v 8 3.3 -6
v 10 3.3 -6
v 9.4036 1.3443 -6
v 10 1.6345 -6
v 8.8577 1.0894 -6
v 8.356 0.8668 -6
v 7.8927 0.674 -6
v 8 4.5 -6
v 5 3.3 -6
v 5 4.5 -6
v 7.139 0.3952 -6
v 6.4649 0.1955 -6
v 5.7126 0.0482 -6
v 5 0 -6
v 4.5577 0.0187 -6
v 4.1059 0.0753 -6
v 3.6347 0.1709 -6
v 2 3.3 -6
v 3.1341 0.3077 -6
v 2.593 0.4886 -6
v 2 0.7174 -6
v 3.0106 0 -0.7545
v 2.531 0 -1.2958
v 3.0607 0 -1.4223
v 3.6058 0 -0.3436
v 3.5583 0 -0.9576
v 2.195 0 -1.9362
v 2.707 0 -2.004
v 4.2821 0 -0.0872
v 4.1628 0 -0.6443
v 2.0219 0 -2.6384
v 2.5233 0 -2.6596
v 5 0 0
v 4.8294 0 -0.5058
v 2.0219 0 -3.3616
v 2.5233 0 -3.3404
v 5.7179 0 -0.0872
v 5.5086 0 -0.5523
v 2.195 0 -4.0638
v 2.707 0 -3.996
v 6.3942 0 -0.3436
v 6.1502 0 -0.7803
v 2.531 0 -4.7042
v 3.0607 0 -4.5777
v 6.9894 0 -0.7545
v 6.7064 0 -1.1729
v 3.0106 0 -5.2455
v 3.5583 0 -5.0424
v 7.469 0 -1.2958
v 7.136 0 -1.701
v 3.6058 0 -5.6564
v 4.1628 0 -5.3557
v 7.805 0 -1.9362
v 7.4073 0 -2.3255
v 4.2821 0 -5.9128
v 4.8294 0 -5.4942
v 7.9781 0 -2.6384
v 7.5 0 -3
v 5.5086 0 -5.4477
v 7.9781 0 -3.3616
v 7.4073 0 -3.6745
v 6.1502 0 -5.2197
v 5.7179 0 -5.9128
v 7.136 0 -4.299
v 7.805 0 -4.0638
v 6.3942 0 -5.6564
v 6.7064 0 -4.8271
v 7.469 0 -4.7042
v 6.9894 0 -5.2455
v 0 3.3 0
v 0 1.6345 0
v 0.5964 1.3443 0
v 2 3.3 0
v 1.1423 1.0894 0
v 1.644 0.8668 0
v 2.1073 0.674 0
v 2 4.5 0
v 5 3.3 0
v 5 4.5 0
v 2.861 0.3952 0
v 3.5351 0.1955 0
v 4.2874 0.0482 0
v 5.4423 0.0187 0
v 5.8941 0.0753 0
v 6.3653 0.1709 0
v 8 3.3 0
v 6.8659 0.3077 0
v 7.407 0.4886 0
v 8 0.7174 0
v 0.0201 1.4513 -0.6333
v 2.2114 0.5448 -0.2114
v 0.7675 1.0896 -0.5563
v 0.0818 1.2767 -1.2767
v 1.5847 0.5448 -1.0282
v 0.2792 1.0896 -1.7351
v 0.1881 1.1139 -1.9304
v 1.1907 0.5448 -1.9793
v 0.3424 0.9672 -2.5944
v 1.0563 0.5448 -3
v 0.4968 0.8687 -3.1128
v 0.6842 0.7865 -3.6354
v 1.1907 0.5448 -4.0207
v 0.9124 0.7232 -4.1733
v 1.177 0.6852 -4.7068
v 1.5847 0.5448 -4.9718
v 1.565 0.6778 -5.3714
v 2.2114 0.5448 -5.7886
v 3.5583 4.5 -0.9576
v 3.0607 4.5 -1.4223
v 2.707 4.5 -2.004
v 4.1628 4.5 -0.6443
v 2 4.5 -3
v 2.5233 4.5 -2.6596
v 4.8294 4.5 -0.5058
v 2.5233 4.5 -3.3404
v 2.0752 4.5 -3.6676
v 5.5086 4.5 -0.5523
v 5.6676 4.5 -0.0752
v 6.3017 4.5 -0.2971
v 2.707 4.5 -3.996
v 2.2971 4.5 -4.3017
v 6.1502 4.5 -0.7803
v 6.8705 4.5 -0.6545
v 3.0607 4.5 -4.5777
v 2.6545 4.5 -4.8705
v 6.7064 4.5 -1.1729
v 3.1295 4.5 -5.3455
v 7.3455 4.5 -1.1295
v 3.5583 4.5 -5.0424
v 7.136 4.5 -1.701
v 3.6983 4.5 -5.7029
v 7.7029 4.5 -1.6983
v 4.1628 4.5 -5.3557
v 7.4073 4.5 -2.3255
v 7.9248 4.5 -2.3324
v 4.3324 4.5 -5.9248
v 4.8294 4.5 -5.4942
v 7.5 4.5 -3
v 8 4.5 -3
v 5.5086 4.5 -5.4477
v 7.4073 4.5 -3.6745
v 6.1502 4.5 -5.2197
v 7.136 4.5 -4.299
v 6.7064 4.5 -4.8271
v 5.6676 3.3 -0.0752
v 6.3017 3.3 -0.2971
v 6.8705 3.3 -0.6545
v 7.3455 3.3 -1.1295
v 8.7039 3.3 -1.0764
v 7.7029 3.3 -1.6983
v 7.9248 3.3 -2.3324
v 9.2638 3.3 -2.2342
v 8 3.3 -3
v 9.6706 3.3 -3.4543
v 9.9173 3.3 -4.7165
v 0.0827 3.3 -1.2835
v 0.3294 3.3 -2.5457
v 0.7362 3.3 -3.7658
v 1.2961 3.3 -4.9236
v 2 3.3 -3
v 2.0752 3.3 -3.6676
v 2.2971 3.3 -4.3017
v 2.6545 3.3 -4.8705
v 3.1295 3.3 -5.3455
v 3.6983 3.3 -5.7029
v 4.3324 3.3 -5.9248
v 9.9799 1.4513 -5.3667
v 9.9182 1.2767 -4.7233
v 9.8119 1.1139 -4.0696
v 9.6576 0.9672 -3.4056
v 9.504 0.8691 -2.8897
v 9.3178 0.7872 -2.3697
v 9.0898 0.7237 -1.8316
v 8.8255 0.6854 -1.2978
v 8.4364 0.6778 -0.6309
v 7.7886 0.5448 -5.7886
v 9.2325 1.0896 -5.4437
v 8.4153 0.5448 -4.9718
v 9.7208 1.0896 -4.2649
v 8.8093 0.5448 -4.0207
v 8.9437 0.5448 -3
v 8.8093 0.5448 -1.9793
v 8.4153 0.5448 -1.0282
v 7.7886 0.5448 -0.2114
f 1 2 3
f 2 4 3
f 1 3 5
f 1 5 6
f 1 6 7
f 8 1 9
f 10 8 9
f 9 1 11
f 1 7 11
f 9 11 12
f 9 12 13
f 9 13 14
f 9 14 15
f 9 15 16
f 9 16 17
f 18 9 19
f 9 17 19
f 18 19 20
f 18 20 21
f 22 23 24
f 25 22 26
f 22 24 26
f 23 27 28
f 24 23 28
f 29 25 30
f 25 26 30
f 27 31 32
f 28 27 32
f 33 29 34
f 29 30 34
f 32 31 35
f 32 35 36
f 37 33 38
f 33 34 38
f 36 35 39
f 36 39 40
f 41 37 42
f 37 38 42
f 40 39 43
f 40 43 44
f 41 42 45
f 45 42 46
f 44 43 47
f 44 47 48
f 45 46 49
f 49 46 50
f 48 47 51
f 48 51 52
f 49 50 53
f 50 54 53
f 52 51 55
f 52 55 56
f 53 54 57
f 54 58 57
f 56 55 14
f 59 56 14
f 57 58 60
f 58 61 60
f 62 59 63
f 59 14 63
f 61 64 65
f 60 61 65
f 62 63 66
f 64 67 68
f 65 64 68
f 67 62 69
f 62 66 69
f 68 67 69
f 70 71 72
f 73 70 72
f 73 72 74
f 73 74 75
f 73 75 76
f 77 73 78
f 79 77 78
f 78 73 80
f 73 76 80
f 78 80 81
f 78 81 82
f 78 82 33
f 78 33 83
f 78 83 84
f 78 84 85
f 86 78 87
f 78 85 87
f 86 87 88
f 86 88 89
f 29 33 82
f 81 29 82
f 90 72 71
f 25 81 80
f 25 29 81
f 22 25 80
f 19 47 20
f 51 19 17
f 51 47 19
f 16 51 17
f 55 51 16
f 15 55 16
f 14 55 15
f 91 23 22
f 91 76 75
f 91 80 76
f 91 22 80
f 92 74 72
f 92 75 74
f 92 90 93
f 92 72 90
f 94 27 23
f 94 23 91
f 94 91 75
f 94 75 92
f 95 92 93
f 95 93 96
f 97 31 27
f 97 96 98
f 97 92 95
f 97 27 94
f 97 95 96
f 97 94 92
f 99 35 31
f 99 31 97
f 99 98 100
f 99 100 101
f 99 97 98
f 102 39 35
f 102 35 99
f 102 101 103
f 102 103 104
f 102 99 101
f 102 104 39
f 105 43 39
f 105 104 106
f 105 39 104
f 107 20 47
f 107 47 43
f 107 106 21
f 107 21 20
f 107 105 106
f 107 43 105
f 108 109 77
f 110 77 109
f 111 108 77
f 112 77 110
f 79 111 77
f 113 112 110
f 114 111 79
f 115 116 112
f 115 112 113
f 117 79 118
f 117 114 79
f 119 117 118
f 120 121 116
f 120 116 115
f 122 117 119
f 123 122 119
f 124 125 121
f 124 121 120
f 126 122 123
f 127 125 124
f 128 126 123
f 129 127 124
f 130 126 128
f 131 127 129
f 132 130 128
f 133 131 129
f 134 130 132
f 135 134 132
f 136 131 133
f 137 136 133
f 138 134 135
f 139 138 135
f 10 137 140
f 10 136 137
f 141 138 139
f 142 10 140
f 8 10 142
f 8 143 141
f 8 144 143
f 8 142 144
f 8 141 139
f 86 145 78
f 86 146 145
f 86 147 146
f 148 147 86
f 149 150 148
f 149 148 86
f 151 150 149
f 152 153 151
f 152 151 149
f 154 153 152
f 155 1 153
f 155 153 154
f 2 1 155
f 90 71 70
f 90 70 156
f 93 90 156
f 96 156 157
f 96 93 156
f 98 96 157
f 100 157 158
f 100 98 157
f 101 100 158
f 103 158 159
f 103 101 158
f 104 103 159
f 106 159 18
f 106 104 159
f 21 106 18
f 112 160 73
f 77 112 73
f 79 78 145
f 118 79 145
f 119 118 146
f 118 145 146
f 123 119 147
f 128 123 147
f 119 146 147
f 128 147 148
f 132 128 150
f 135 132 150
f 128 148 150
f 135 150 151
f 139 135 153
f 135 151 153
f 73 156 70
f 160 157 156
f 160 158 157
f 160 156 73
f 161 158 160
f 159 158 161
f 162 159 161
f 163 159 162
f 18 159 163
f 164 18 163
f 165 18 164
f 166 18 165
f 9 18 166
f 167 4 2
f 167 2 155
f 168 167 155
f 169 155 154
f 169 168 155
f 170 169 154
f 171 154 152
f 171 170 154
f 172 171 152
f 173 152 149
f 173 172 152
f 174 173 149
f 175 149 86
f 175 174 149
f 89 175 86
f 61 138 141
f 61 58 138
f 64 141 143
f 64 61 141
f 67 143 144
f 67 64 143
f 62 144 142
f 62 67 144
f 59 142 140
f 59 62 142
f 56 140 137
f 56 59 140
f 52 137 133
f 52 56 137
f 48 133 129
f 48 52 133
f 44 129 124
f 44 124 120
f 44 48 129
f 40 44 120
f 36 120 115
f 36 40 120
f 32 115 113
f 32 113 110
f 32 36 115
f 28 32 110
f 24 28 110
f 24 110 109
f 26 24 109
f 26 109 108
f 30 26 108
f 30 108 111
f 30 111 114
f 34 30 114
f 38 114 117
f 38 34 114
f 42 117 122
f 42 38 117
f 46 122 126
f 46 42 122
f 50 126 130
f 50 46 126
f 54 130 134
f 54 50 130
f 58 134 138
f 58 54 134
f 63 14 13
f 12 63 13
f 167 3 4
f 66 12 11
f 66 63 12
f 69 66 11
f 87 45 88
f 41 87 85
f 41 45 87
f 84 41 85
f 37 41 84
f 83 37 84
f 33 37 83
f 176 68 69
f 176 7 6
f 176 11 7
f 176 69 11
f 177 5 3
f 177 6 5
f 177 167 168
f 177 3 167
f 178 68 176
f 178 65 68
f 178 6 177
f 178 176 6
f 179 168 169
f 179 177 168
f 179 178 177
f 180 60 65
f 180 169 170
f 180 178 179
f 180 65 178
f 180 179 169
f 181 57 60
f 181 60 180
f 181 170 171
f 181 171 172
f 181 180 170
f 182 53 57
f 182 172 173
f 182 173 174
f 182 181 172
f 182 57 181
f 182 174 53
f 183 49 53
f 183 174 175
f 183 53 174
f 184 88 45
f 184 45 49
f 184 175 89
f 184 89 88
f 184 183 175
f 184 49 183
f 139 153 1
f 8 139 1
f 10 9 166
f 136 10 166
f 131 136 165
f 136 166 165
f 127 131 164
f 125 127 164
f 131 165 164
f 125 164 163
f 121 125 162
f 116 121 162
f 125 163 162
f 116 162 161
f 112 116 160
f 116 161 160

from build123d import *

# Parameters (mm, degrees)
SKETCH_1_W          = 10
SKETCH_1_H          = 6
SKETCH_1_R          = 2.5
EXTRUDE_1_DEPTH     = 3.3
SKETCH_2_R          = 2.5
EXTRUDE_2_DEPTH     = 1.2
CUT_EXTRUDE_1_DEPTH = 5.5


with BuildPart() as part:
    # 草图1 → 凸台-拉伸1 (new body)
    with BuildSketch(Plane(origin=(0, 0, 0), x_dir=(1, 0, 0), z_dir=(0, 1, 0))):
        with Locations((5, 3)):
            Rectangle(SKETCH_1_W, SKETCH_1_H)
        with Locations((5, 3)):
            Circle(SKETCH_1_R, mode=Mode.SUBTRACT)
    extrude(amount=EXTRUDE_1_DEPTH)

    # 草图2 → 凸台-拉伸2 (add)
    with BuildSketch(Plane(origin=(0, 3.3, 0), x_dir=(1, 0, 0), z_dir=(0, 1, 0))):
        with BuildLine():
            Line((2, 3), (2, 0))
            Line((2, 0), (5, 0))
            ThreePointArc((5, 0), (7.121320344, 0.878679656), (8, 3))
            Line((8, 3), (8, 6))
            Line((8, 6), (5, 6))
            ThreePointArc((5, 6), (2.878679656, 5.121320344), (2, 3))
        make_face()
        with Locations((5, 3)):
            Circle(SKETCH_2_R, mode=Mode.SUBTRACT)
    extrude(amount=EXTRUDE_2_DEPTH)

    # 草图3 → 切除-拉伸1 (cut, through all)
    with BuildSketch(Plane(origin=(0, 0, 0), x_dir=(1, 0, 0), z_dir=(0, 1, 0))):
        with BuildLine():
            Line((2, 6), (0, 6))
            Line((0, 6), (0, 0))
            ThreePointArc((0, 0), (0.513167019, 3.16227766), (2, 6))
        make_face()
        with BuildLine():
            Line((10, 0), (10, 6))
            ThreePointArc((10, 6), (9.486832981, 2.83772234), (8, 0))
            Line((8, 0), (10, 0))
        make_face()
    extrude(amount=CUT_EXTRUDE_1_DEPTH, mode=Mode.SUBTRACT)

    # 草图4 one side → 切除-旋转1 (revolve, cut)
    with BuildSketch(Plane(origin=(-3, 0, -3), x_dir=(1, 0, 0), z_dir=(0, 0, 1))):
        Polygon((16, 0), (16, 2.886751346), (11, 0), align=None)
    revolve(axis=Axis((5, 3.3, -3), (0, -1, 0)), mode=Mode.SUBTRACT)


solid = part.part
